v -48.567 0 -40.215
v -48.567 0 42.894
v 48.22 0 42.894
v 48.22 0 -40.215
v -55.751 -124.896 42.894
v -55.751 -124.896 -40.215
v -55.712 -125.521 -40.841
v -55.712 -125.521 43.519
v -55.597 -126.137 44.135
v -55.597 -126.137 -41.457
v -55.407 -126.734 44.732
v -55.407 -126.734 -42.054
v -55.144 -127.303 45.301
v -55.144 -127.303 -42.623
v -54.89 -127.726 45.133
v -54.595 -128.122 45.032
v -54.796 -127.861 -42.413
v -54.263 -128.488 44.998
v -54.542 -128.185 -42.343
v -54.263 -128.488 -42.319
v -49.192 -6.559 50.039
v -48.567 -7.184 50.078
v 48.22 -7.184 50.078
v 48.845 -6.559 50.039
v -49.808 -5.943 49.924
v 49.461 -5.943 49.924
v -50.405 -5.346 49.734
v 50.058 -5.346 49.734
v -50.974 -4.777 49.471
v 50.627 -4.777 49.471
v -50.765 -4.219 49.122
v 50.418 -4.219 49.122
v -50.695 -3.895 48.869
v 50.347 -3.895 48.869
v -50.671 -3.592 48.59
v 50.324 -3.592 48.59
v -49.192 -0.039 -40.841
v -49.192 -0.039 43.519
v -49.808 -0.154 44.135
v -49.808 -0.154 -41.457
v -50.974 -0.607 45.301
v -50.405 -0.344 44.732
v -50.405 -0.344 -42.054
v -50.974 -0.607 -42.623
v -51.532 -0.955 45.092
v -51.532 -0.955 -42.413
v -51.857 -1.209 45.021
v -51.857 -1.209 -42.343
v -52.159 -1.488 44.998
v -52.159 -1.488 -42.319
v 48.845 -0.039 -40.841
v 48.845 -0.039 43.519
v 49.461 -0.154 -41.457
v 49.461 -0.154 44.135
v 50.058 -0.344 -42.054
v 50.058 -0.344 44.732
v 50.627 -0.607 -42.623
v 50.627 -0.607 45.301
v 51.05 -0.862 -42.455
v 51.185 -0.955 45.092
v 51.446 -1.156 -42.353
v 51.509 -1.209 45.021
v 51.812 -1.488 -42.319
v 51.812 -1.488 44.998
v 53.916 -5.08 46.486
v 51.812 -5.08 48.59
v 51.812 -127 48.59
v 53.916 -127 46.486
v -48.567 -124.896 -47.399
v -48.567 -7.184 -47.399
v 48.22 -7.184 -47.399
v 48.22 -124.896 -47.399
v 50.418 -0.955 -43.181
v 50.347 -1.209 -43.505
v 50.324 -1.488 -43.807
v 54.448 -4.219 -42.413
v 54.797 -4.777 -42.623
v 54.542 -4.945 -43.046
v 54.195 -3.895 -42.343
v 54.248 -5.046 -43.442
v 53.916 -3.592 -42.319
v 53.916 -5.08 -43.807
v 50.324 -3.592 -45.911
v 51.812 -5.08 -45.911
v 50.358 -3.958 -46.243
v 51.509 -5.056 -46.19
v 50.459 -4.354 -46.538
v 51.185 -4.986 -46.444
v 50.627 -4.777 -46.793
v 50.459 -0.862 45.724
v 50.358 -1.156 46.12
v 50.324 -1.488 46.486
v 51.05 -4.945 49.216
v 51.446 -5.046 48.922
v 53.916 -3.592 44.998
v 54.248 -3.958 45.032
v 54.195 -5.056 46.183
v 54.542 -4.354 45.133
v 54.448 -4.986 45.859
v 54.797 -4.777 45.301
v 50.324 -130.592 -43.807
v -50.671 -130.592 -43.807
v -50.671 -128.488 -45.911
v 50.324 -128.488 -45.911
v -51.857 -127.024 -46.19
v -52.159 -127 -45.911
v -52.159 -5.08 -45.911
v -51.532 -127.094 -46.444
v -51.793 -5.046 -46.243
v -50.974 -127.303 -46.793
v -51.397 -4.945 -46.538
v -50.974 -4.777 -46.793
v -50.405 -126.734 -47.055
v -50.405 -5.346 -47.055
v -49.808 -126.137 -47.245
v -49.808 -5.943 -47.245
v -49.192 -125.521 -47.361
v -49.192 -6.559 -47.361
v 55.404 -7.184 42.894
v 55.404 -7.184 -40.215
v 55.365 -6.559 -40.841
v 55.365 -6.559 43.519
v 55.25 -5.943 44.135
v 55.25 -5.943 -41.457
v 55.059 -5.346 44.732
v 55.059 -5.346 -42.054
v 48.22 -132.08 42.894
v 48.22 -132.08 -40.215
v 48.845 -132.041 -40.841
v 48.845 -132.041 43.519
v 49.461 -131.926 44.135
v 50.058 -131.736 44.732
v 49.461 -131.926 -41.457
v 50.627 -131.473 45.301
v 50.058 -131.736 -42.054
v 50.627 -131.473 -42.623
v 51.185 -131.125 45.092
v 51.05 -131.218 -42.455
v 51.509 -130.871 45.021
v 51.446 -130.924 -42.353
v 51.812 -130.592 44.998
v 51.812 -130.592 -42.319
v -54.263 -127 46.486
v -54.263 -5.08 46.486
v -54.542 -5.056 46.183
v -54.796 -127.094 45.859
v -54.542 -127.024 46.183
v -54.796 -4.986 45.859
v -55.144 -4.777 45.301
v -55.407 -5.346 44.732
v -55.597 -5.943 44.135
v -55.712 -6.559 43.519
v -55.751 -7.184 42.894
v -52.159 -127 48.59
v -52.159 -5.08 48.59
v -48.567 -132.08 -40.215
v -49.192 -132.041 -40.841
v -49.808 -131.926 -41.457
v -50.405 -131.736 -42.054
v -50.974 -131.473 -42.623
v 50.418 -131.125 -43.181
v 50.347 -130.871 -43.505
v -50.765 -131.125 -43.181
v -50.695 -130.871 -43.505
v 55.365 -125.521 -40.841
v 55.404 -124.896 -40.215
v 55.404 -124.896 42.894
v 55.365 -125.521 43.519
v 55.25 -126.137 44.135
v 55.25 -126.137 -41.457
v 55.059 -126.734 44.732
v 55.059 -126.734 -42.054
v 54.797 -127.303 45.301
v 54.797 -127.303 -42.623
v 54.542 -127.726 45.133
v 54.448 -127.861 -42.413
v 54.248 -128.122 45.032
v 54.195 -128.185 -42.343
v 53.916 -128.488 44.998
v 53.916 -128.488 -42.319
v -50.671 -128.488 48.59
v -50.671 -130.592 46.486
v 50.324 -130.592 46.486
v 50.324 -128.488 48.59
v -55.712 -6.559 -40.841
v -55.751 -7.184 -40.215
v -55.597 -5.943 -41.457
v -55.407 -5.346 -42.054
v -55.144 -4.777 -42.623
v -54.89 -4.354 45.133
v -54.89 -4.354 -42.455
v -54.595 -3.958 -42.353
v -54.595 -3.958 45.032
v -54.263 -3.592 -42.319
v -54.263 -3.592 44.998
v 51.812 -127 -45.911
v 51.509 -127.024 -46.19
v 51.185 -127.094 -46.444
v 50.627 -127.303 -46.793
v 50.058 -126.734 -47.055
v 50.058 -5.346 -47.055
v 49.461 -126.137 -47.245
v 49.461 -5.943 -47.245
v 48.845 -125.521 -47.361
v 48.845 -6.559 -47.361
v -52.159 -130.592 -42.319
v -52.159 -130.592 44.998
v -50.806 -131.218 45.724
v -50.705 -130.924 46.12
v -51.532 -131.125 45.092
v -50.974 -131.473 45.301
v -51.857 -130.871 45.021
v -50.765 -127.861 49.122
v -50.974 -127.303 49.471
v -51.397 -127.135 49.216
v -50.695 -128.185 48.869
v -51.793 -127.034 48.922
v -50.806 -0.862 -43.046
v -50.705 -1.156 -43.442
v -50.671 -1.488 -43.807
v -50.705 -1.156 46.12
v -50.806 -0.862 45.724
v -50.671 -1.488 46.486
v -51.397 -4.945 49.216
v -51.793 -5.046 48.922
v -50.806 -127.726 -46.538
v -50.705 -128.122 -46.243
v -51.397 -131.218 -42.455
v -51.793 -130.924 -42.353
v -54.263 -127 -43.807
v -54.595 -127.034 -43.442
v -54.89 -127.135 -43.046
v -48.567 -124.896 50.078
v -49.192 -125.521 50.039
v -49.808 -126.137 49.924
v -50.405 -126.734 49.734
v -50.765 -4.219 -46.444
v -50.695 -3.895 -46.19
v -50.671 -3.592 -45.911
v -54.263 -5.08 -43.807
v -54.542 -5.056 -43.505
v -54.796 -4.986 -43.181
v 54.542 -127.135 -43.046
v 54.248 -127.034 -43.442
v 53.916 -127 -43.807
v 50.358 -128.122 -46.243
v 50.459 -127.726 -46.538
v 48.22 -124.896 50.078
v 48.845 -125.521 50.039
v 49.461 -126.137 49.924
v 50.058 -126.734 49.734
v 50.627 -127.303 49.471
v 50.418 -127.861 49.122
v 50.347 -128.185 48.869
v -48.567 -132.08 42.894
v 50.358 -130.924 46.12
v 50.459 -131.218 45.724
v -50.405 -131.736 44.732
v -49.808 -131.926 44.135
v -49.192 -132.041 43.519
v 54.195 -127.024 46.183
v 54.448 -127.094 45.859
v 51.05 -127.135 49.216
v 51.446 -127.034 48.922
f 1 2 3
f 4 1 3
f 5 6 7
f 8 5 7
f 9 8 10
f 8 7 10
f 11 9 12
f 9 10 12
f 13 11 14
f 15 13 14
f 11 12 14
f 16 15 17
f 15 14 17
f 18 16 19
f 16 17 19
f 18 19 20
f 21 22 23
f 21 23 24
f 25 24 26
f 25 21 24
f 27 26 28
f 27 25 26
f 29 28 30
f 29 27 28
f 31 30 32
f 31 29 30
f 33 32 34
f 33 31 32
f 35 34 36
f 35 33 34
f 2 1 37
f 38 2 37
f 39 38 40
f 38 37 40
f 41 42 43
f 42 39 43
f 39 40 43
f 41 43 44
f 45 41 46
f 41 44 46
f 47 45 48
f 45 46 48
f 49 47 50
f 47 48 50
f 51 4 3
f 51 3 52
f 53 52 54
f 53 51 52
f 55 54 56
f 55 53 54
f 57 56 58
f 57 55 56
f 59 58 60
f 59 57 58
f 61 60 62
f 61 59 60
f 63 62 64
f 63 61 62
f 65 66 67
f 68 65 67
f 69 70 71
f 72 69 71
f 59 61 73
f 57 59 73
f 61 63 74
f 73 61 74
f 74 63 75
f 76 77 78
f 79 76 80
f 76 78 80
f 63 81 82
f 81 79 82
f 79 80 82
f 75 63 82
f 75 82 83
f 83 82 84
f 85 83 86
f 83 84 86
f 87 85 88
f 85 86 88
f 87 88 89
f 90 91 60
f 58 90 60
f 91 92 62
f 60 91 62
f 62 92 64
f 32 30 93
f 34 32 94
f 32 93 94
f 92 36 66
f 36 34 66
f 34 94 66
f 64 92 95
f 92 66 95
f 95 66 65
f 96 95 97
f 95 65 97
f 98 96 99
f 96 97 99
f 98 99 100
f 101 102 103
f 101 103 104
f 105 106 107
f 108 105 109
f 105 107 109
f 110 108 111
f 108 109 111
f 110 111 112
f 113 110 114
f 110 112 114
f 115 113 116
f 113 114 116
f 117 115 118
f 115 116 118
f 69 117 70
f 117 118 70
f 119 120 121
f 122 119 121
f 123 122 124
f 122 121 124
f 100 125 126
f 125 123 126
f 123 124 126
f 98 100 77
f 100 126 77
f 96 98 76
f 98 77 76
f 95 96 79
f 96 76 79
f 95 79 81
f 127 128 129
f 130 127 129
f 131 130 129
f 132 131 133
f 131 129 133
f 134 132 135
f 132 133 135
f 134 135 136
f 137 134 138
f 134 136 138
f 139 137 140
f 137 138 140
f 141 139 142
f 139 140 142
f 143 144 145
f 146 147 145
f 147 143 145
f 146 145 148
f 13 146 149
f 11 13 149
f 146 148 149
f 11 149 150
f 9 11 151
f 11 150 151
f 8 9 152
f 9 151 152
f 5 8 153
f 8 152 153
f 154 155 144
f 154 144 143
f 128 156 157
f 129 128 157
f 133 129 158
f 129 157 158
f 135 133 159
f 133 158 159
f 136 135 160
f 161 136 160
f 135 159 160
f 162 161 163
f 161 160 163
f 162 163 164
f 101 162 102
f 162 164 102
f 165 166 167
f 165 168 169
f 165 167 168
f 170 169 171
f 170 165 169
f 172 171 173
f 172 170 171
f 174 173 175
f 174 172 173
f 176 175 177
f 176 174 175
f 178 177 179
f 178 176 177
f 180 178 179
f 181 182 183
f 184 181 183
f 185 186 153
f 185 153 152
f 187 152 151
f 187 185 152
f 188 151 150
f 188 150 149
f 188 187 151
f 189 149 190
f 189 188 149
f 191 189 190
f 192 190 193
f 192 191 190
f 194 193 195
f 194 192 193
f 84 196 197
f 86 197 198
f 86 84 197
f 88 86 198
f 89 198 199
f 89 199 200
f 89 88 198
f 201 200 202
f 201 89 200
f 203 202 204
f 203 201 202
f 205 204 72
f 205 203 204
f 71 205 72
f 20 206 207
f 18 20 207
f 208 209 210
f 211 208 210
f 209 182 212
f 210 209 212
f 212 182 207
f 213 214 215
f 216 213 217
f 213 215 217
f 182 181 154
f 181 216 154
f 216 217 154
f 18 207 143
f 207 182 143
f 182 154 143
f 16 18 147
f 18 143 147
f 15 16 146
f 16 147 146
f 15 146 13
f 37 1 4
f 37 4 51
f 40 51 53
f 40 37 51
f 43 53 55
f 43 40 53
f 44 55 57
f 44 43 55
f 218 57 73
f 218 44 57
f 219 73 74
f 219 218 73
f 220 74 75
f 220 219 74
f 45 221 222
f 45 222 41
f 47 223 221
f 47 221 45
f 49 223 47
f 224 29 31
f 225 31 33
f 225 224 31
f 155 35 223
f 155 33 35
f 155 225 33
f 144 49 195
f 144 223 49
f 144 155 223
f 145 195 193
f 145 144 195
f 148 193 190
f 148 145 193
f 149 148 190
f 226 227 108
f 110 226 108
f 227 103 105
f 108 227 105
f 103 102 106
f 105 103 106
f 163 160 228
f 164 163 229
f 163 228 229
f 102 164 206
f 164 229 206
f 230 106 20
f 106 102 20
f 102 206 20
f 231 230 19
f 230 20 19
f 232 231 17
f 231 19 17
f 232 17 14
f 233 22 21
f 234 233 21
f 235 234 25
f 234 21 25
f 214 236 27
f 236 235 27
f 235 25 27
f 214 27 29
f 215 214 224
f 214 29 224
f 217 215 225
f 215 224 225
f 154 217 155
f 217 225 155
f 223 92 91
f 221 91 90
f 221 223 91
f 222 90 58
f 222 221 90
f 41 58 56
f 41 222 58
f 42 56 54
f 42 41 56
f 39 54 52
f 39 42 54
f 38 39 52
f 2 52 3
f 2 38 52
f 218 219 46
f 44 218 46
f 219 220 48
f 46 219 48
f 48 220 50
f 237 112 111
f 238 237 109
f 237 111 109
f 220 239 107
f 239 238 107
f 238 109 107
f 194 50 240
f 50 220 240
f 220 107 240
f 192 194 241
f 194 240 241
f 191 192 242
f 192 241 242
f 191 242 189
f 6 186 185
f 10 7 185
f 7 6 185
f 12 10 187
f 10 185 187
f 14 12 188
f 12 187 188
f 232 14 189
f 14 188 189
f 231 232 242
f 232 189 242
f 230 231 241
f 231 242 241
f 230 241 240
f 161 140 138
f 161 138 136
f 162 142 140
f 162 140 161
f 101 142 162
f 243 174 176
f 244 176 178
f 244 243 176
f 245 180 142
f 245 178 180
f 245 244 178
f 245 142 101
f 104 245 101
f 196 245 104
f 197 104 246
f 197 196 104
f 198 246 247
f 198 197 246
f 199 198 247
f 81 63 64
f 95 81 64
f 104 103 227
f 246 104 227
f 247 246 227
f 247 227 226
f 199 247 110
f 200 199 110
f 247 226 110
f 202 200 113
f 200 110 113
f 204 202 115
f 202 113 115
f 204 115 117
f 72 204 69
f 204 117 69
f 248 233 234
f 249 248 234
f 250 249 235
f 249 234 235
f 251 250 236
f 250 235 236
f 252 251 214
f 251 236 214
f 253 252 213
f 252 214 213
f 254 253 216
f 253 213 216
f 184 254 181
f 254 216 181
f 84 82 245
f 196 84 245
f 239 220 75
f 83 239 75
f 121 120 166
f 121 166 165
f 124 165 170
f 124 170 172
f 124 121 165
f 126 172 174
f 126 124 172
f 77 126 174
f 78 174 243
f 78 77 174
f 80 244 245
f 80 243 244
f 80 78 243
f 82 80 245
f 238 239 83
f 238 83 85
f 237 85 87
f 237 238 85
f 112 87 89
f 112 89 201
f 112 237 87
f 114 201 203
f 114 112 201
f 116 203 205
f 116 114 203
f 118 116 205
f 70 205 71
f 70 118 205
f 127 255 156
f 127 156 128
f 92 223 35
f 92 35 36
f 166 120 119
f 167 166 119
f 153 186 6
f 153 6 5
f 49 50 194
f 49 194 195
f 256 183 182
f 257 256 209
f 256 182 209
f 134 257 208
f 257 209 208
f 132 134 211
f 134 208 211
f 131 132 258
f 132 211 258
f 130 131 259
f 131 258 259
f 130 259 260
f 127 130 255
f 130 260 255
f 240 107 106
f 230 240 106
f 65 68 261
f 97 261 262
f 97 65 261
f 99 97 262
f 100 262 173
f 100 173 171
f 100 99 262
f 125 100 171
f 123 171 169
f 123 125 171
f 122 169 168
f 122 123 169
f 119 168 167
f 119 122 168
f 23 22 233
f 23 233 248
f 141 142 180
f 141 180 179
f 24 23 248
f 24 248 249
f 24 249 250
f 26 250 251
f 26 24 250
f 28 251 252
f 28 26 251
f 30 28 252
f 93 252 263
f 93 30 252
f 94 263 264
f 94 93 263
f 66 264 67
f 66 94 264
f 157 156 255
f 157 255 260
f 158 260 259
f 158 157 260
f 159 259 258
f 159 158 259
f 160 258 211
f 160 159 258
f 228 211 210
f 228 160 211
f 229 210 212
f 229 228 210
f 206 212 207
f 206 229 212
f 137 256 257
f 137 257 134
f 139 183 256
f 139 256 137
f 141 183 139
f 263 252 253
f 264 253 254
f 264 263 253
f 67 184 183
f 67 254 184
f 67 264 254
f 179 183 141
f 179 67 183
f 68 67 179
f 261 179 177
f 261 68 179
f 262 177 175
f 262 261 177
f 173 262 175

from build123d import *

# Parameters (mm, degrees)
F0_W        = 111.1548654735
F0_H        = 97.4772460759
F1_DEPTH    = 132.08
F2_SIZE     = 5.08
F3_T1_DEPTH = 132.4410244843
F3_T3_DEPTH = 111.5158899578
F3_T5_DEPTH = 97.8382705601


# Not quite as in the source:
# - a fillet or chamfer that OpenCascade refuses, or shapes differently, is made with other operations: its cross-section is extruded or revolved along the edge and cut away or added


with BuildPart() as f1:
    # F0 (on Front) → F1 (new body)
    with BuildSketch(Plane.XZ):
        with Locations((-0.1736786216, 1.3392996043)):
            Rectangle(F0_W, F0_H)
    extrude(amount=F1_DEPTH)

    # F2
    f2_edges = [f1.edges().sort_by_distance(p)[0] for p in [
        (55.403754, -66.04, 50.077923),
        (-55.751111, -66.04, 50.077923),
        (-0.173679, 0, 50.077923),
        (-0.173679, -132.08, 50.077923),
        (55.403754, -66.04, -47.399323),
        (55.403754, 0, 1.3393),
        (55.403754, -132.08, 1.3393),
        (-55.751111, -132.08, 1.3393),
        (-0.173679, -132.08, -47.399323),
        (-55.751111, -66.04, -47.399323),
        (-0.173679, 0, -47.399323),
        (-55.751111, 0, 1.3393),
    ]]
    chamfer(f2_edges, length=F2_SIZE)

    # F3: fillet of radius 5.08 on 24 edges, made by hand

    # F3_s2 → F3_t1 (cut)
    with BuildSketch(Plane.XZ.offset(-0.1805122421)):
        with BuildLine():
            ThreePointArc((48.2195492182, 50.0779226422), (50.1635810547, 49.6912306674), (51.8116516667, 48.5900250907))
            Line((51.8116516667, 48.5900250907), (50.3237541151, 50.0779226422))
            Line((50.3237541151, 50.0779226422), (48.2195492182, 50.0779226422))
        make_face()
        with BuildLine():
            ThreePointArc((-48.5669064615, 50.0779226422), (-50.510938298, 49.6912306674), (-52.15900891, 48.5900250907))
            Line((-52.15900891, 48.5900250907), (-50.6711113584, 50.0779226422))
            Line((-50.6711113584, 50.0779226422), (-48.5669064615, 50.0779226422))
        make_face()
        with BuildLine():
            ThreePointArc((53.9158565635, 46.4858201938), (55.0170621403, 44.8377495818), (55.4037541151, 42.8937177454))
            Line((55.4037541151, 42.8937177454), (55.4037541151, 44.9979226422))
            Line((55.4037541151, 44.9979226422), (53.9158565635, 46.4858201938))
        make_face()
        with BuildLine():
            ThreePointArc((55.4037541151, -40.2151185368), (55.0170621403, -42.1591503732), (53.9158565635, -43.8072209852))
            Line((53.9158565635, -43.8072209852), (55.4037541151, -42.3193234336))
            Line((55.4037541151, -42.3193234336), (55.4037541151, -40.2151185368))
        make_face()
        with BuildLine():
            ThreePointArc((51.8116516667, -45.9114258821), (50.1635810547, -47.0126314588), (48.2195492182, -47.3993234336))
            Line((48.2195492182, -47.3993234336), (50.3237541151, -47.3993234336))
            Line((50.3237541151, -47.3993234336), (51.8116516667, -45.9114258821))
        make_face()
        with BuildLine():
            ThreePointArc((-52.15900891, -45.9114258821), (-50.510938298, -47.0126314588), (-48.5669064615, -47.3993234336))
            Line((-48.5669064615, -47.3993234336), (-50.6711113584, -47.3993234336))
            Line((-50.6711113584, -47.3993234336), (-52.15900891, -45.9114258821))
        make_face()
        with BuildLine():
            ThreePointArc((-54.2632138068, 46.4858201938), (-55.3644193836, 44.8377495818), (-55.7511113584, 42.8937177454))
            Line((-55.7511113584, 42.8937177454), (-55.7511113584, 44.9979226422))
            Line((-55.7511113584, 44.9979226422), (-54.2632138068, 46.4858201938))
        make_face()
        with BuildLine():
            ThreePointArc((-55.7511113584, -40.2151185368), (-55.3644193836, -42.1591503732), (-54.2632138068, -43.8072209852))
            Line((-54.2632138068, -43.8072209852), (-55.7511113584, -42.3193234336))
            Line((-55.7511113584, -42.3193234336), (-55.7511113584, -40.2151185368))
        make_face()
    extrude(amount=F3_T1_DEPTH, mode=Mode.SUBTRACT)

    # F3_s4 → F3_t3 (cut)
    with BuildSketch(Plane.YZ.offset(-55.9316236005)):
        with BuildLine():
            ThreePointArc((-7.1842048969, 50.0779226422), (-5.2401730604, 49.6912306674), (-3.5921024484, 48.5900250907))
            Line((-3.5921024484, 48.5900250907), (-5.08, 50.0779226422))
            Line((-5.08, 50.0779226422), (-7.1842048969, 50.0779226422))
        make_face()
        with BuildLine():
            ThreePointArc((-124.8957951031, 50.0779226422), (-126.8398269396, 49.6912306674), (-128.4878975516, 48.5900250907))
            Line((-128.4878975516, 48.5900250907), (-127, 50.0779226422))
            Line((-127, 50.0779226422), (-124.8957951031, 50.0779226422))
        make_face()
        with BuildLine():
            ThreePointArc((-1.4878975516, 46.4858201938), (-0.3866919748, 44.8377495818), (0, 42.8937177454))
            Line((0, 42.8937177454), (0, 44.9979226422))
            Line((0, 44.9979226422), (-1.4878975516, 46.4858201938))
        make_face()
        with BuildLine():
            ThreePointArc((0, -40.2151185368), (-0.3866919748, -42.1591503732), (-1.4878975516, -43.8072209852))
            Line((-1.4878975516, -43.8072209852), (0, -42.3193234336))
            Line((0, -42.3193234336), (0, -40.2151185368))
        make_face()
        with BuildLine():
            ThreePointArc((-3.5921024484, -45.9114258821), (-5.2401730604, -47.0126314588), (-7.1842048969, -47.3993234336))
            Line((-7.1842048969, -47.3993234336), (-5.08, -47.3993234336))
            Line((-5.08, -47.3993234336), (-3.5921024484, -45.9114258821))
        make_face()
        with BuildLine():
            ThreePointArc((-128.4878975516, -45.9114258821), (-126.8398269396, -47.0126314588), (-124.8957951031, -47.3993234336))
            Line((-124.8957951031, -47.3993234336), (-127, -47.3993234336))
            Line((-127, -47.3993234336), (-128.4878975516, -45.9114258821))
        make_face()
        with BuildLine():
            ThreePointArc((-130.5921024484, 46.4858201938), (-131.6933080252, 44.8377495818), (-132.08, 42.8937177454))
            Line((-132.08, 42.8937177454), (-132.08, 44.9979226422))
            Line((-132.08, 44.9979226422), (-130.5921024484, 46.4858201938))
        make_face()
        with BuildLine():
            ThreePointArc((-132.08, -40.2151185368), (-131.6933080252, -42.1591503732), (-130.5921024484, -43.8072209852))
            Line((-130.5921024484, -43.8072209852), (-132.08, -42.3193234336))
            Line((-132.08, -42.3193234336), (-132.08, -40.2151185368))
        make_face()
    extrude(amount=F3_T3_DEPTH, mode=Mode.SUBTRACT)

    # F3_s6 → F3_t5 (cut)
    with BuildSketch(Plane.XY.offset(-47.5798356758)):
        with BuildLine():
            ThreePointArc((48.2195492182, 0), (50.1635810547, -0.3866919748), (51.8116516667, -1.4878975516))
            Line((51.8116516667, -1.4878975516), (50.3237541151, 0))
            Line((50.3237541151, 0), (48.2195492182, 0))
        make_face()
        with BuildLine():
            ThreePointArc((-48.5669064615, 0), (-50.510938298, -0.3866919748), (-52.15900891, -1.4878975516))
            Line((-52.15900891, -1.4878975516), (-50.6711113584, 0))
            Line((-50.6711113584, 0), (-48.5669064615, 0))
        make_face()
        with BuildLine():
            ThreePointArc((55.4037541151, -7.1842048969), (55.0170621403, -5.2401730604), (53.9158565635, -3.5921024484))
            Line((53.9158565635, -3.5921024484), (55.4037541151, -5.08))
            Line((55.4037541151, -5.08), (55.4037541151, -7.1842048969))
        make_face()
        with BuildLine():
            ThreePointArc((55.4037541151, -124.8957951031), (55.0170621403, -126.8398269396), (53.9158565635, -128.4878975516))
            Line((53.9158565635, -128.4878975516), (55.4037541151, -127))
            Line((55.4037541151, -127), (55.4037541151, -124.8957951031))
        make_face()
        with BuildLine():
            ThreePointArc((-55.7511113584, -7.1842048969), (-55.3644193836, -5.2401730604), (-54.2632138068, -3.5921024484))
            Line((-54.2632138068, -3.5921024484), (-55.7511113584, -5.08))
            Line((-55.7511113584, -5.08), (-55.7511113584, -7.1842048969))
        make_face()
        with BuildLine():
            ThreePointArc((-55.7511113584, -124.8957951031), (-55.3644193836, -126.8398269396), (-54.2632138068, -128.4878975516))
            Line((-54.2632138068, -128.4878975516), (-55.7511113584, -127))
            Line((-55.7511113584, -127), (-55.7511113584, -124.8957951031))
        make_face()
        with BuildLine():
            ThreePointArc((48.2195492182, -132.08), (50.1635810547, -131.6933080252), (51.8116516667, -130.5921024484))
            Line((51.8116516667, -130.5921024484), (50.3237541151, -132.08))
            Line((50.3237541151, -132.08), (48.2195492182, -132.08))
        make_face()
        with BuildLine():
            ThreePointArc((-48.5669064615, -132.08), (-50.510938298, -131.6933080252), (-52.15900891, -130.5921024484))
            Line((-52.15900891, -130.5921024484), (-50.6711113584, -132.08))
            Line((-50.6711113584, -132.08), (-48.5669064615, -132.08))
        make_face()
    extrude(amount=F3_T5_DEPTH, mode=Mode.SUBTRACT)


solid = f1.part
